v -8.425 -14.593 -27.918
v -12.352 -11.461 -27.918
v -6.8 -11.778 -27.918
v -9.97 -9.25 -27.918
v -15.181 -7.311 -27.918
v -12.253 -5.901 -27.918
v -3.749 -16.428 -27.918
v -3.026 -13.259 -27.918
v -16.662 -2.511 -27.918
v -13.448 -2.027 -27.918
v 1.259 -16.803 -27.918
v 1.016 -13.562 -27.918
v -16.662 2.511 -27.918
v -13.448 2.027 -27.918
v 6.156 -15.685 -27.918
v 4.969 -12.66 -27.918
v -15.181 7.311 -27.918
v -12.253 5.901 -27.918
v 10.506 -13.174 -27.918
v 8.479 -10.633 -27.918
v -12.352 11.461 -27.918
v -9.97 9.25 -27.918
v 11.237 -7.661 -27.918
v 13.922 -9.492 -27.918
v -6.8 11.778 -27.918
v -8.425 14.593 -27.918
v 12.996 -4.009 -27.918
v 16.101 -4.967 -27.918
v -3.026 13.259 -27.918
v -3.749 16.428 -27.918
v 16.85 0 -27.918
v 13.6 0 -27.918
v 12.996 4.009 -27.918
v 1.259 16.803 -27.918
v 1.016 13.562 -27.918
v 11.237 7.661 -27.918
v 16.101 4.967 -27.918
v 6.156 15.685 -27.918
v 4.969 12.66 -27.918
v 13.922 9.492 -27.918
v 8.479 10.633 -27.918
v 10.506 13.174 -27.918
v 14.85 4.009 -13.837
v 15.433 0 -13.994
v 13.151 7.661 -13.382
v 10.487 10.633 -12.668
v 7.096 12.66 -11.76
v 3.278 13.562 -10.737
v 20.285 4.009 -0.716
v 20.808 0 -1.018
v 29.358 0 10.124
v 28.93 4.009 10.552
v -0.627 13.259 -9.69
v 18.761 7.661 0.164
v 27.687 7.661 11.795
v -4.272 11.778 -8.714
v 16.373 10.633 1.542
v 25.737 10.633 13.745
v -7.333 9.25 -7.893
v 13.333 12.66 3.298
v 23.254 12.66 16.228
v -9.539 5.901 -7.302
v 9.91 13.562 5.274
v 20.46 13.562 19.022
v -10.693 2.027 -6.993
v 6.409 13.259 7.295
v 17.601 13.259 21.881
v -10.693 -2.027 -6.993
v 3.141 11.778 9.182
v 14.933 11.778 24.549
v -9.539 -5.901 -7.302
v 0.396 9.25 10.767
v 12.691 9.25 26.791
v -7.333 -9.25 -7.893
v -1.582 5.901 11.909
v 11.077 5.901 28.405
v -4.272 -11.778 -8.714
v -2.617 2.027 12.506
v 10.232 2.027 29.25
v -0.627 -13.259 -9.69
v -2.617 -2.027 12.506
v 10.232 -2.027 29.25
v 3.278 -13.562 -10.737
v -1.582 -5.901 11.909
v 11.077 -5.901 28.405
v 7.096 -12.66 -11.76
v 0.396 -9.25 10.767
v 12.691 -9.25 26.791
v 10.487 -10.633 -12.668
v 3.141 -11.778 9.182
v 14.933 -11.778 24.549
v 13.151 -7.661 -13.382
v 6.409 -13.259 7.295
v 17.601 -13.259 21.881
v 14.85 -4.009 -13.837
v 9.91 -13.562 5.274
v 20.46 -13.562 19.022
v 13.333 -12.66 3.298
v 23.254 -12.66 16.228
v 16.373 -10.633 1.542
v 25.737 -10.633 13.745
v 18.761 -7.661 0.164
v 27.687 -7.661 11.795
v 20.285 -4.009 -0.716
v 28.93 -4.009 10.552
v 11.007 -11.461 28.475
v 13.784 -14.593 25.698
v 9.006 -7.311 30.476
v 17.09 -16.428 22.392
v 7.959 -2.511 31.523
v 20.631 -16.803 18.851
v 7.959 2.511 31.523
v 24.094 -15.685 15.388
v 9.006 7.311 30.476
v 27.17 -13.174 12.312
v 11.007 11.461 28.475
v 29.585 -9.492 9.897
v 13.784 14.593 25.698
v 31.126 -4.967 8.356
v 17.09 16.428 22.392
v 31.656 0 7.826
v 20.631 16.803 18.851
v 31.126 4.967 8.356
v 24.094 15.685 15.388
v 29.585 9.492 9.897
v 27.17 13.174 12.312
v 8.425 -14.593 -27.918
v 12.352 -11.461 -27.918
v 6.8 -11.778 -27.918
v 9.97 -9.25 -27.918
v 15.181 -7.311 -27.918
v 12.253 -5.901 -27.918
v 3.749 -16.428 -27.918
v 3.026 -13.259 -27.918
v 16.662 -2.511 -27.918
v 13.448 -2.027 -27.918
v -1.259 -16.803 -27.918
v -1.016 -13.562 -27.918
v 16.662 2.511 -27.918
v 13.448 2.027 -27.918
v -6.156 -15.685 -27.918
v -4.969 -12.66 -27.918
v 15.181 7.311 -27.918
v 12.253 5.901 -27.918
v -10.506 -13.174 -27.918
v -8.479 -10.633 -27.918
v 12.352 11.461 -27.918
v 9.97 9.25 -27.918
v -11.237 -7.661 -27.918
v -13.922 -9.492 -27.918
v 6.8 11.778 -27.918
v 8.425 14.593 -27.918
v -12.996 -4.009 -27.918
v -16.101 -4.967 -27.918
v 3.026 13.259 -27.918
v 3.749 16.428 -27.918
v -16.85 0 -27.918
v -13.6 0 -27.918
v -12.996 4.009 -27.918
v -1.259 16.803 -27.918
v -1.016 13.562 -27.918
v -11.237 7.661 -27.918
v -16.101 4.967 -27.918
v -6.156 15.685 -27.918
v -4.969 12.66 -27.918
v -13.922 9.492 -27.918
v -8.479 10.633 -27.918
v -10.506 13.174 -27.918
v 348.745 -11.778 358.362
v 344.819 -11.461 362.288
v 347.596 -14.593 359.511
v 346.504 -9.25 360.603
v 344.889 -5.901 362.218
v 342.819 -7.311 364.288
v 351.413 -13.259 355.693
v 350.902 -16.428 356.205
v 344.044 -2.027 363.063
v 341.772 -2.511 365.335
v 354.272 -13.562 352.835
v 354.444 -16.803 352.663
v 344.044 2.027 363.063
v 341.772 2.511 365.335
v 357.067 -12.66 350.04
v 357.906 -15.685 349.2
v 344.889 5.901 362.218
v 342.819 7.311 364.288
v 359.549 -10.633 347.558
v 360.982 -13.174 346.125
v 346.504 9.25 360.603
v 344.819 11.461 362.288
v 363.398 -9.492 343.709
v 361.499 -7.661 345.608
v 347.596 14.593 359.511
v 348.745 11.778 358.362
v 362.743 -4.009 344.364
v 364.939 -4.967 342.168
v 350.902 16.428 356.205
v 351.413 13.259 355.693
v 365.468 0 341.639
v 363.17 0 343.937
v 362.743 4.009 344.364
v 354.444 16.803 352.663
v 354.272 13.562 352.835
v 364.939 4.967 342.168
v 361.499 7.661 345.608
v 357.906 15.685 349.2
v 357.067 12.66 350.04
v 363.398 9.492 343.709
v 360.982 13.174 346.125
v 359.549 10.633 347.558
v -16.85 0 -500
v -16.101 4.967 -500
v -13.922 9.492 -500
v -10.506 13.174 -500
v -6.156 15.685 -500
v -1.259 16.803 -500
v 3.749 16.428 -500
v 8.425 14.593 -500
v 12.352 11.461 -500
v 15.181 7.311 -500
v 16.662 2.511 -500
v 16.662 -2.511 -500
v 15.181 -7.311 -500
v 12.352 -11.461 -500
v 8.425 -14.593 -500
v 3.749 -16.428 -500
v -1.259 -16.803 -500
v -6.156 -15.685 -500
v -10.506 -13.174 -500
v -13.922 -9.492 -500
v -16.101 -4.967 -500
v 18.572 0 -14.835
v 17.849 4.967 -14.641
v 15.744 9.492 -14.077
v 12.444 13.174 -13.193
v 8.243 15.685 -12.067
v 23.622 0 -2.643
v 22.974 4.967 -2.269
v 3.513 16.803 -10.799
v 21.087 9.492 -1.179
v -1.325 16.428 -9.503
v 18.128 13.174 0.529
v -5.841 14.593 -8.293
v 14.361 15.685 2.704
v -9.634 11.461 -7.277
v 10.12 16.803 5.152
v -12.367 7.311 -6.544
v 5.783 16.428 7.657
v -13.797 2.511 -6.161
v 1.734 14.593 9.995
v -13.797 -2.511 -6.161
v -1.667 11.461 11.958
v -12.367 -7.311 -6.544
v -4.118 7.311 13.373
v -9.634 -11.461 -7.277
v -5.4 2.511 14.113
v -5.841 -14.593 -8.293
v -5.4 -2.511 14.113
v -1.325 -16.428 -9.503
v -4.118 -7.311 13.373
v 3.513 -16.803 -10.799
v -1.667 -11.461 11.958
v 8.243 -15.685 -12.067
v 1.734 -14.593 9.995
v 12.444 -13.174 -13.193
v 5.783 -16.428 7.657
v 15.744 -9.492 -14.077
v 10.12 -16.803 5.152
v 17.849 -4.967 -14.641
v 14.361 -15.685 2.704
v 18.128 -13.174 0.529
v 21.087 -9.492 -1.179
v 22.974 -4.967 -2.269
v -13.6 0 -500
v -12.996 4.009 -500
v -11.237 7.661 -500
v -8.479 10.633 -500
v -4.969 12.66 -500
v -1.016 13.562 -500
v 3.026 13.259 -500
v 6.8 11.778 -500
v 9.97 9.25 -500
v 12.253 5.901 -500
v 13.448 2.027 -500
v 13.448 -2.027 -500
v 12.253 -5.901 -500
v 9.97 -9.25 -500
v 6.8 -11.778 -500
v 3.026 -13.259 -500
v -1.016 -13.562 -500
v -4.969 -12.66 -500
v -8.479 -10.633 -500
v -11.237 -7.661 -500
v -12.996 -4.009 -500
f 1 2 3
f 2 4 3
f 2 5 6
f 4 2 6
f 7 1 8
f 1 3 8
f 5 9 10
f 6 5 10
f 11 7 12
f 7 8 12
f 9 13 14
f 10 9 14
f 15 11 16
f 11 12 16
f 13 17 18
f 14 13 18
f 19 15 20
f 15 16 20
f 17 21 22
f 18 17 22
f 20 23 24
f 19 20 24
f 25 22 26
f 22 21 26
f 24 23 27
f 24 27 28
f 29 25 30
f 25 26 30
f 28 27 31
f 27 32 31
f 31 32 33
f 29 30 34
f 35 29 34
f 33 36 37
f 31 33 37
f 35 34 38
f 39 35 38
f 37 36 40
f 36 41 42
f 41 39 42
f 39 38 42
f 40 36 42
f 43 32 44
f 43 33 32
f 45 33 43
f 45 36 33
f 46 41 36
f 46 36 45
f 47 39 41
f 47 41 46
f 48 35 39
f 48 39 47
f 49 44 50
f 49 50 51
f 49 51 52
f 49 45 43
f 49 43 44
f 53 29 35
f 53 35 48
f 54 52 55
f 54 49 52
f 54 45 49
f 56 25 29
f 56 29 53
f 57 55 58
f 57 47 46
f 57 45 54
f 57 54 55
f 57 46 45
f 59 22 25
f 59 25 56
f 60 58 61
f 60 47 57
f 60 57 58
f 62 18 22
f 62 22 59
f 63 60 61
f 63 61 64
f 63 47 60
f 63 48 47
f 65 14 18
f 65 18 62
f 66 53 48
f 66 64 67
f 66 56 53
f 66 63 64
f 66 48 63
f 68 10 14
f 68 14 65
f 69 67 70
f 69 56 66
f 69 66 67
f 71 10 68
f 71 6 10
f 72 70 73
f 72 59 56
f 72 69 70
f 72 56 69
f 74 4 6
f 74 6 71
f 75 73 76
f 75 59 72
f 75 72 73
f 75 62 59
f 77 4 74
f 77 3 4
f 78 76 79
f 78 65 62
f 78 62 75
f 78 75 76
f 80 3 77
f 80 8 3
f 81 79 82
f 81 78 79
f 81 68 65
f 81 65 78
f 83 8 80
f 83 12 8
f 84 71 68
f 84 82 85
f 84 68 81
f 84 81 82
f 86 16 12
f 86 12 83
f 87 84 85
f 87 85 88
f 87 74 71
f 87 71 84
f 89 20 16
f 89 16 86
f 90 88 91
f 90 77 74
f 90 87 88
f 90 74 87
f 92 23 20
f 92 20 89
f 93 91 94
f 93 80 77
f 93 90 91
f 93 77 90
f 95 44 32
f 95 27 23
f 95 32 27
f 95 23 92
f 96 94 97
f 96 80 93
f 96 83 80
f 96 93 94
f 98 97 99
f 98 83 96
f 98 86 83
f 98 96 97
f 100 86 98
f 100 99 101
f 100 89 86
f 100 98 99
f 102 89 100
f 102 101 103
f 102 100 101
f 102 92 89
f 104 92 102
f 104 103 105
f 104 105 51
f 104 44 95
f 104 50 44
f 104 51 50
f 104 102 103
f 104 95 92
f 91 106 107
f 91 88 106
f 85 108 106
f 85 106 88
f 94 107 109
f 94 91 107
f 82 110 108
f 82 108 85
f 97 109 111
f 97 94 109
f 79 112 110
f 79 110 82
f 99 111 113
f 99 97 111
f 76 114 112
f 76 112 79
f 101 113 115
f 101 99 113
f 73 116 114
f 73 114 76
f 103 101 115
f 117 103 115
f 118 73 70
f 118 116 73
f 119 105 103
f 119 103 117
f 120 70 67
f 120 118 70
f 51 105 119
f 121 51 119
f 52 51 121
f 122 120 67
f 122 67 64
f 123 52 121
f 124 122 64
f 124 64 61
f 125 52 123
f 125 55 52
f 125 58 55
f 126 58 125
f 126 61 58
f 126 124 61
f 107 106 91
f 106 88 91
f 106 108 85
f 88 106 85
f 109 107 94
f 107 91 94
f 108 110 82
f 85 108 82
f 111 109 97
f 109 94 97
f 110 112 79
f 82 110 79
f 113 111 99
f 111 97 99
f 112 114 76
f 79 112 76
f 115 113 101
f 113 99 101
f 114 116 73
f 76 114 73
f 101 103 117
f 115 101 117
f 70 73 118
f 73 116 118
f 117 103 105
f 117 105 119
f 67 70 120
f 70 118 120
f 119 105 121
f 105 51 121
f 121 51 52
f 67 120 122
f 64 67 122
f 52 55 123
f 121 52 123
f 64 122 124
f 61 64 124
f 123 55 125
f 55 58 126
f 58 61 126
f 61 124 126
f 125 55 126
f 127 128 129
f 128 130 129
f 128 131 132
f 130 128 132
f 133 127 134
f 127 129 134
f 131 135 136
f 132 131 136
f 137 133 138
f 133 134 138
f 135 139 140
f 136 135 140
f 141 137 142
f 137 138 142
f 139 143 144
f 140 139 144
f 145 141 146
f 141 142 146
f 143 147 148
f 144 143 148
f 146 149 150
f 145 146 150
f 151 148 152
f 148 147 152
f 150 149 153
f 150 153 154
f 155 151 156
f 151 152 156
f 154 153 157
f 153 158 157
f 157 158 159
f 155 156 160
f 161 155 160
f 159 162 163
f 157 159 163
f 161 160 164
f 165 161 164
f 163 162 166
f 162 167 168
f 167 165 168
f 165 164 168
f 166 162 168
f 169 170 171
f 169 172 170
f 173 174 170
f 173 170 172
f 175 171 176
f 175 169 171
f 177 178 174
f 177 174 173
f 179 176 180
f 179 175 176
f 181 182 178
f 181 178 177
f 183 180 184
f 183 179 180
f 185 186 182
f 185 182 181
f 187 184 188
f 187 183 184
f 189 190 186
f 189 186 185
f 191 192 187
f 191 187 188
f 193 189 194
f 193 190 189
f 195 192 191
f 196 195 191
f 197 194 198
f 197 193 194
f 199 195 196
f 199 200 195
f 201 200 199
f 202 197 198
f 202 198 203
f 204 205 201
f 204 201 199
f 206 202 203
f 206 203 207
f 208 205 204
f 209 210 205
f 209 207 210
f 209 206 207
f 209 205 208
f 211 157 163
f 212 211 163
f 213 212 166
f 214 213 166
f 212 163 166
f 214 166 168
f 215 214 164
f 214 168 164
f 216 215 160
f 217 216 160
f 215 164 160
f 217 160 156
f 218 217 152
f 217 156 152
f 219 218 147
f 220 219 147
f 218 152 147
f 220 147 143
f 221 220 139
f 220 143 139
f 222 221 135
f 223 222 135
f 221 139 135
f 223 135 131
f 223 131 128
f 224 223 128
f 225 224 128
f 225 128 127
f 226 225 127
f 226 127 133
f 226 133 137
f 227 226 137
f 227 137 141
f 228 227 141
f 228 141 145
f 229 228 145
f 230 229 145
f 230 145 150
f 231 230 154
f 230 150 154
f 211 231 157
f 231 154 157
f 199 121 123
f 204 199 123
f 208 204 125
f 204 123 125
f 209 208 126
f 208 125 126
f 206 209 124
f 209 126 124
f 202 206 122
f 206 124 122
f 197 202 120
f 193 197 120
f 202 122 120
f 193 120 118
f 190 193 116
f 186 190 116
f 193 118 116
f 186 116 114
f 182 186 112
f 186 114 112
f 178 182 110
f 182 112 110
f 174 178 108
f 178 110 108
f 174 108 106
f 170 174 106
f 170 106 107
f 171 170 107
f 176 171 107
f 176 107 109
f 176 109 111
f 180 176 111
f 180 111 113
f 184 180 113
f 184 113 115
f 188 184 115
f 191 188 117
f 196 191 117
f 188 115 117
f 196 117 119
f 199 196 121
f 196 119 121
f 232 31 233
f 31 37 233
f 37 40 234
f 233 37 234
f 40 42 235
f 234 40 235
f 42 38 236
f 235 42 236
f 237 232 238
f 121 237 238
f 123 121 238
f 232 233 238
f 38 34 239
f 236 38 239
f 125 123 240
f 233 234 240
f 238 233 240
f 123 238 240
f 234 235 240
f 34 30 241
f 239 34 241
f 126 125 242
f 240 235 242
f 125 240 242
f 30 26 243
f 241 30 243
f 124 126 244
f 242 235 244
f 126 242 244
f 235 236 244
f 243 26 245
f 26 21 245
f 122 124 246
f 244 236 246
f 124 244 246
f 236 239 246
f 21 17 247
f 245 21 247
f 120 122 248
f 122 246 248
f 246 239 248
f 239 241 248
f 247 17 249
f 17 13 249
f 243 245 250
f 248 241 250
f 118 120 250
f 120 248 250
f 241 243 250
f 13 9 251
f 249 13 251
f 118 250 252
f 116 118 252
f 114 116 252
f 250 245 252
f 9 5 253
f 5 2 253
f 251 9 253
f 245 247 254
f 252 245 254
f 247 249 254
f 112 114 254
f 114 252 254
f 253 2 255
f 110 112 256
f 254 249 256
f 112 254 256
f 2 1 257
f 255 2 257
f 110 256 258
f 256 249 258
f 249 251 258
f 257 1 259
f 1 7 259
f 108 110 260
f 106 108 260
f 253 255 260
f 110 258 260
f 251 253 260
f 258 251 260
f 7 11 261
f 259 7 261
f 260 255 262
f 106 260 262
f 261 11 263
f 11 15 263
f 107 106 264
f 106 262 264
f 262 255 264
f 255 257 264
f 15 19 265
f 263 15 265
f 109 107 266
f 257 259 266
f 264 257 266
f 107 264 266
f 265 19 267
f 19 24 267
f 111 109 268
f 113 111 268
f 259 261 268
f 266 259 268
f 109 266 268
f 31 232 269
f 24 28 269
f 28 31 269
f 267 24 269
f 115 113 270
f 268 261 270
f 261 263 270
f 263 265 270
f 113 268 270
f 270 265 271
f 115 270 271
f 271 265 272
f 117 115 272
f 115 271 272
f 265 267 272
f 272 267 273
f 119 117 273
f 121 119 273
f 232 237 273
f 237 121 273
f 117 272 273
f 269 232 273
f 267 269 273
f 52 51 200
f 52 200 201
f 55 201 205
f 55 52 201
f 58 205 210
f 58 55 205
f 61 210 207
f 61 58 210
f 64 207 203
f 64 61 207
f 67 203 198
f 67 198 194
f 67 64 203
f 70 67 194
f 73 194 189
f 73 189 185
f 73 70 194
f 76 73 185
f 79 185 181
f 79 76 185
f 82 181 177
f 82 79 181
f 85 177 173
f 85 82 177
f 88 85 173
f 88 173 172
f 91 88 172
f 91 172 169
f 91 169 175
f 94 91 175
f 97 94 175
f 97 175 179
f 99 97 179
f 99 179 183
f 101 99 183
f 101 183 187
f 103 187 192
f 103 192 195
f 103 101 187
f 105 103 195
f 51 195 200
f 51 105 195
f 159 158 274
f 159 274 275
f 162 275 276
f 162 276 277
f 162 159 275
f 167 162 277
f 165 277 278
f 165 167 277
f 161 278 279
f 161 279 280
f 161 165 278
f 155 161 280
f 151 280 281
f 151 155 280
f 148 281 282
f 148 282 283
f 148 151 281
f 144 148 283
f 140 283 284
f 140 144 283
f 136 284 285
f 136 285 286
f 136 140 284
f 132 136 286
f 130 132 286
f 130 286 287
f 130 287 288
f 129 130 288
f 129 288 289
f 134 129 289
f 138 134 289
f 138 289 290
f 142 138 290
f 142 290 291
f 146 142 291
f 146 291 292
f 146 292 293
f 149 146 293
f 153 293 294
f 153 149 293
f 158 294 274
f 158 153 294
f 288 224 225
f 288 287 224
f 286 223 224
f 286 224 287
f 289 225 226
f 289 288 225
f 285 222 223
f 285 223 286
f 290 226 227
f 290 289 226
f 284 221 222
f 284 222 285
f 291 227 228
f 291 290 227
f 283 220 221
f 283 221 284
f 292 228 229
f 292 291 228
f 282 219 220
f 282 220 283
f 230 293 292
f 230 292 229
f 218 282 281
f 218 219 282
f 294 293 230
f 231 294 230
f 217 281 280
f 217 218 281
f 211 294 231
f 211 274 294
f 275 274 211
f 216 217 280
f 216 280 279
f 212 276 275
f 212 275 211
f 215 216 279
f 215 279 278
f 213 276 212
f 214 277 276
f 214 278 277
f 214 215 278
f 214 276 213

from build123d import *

# Parameters (mm, degrees)
SKIZZE1_ON_SEGMENT_1_R   = 16.85
SKIZZE1_ON_SEGMENT_1_R_2 = 13.6
STRUKTURBAUTEIL2_DEPTH   = 472.082005896
SKIZZE1_ON_SEGMENT_2_R   = 16.85
SKIZZE1_ON_SEGMENT_2_R_2 = 13.6
STRUKTURBAUTEIL2_2_ANGLE = 45
SKIZZE1_R                = 16.85
SKIZZE1_R_2              = 13.6
STRUKTURBAUTEIL2_3_DEPTH = 472.082005896


with BuildPart() as part:
    # Skizze1 on segment 1 (carried to segment 1) → Strukturbauteil2 (new body)
    with BuildSketch(Plane(origin=(19.741002948, 0, 19.741002948), x_dir=(0.707106781, 0, -0.707106781), z_dir=(0.707106781, 0, 0.707106781))):
        Circle(SKIZZE1_ON_SEGMENT_1_R)
        Circle(SKIZZE1_ON_SEGMENT_1_R_2, mode=Mode.SUBTRACT)
    extrude(amount=STRUKTURBAUTEIL2_DEPTH)


with BuildPart() as body_2:
    # Skizze1 on segment 2 (carried to the start of arc 2) → Strukturbauteil2 2 (revolve)
    with BuildSketch(Plane.XY.offset(-27.917994104)):
        Circle(SKIZZE1_ON_SEGMENT_2_R)
        Circle(SKIZZE1_ON_SEGMENT_2_R_2, mode=Mode.SUBTRACT)
    revolve(axis=Axis((67.4, 0, -27.917994104), (0, 1, 0)), revolution_arc=STRUKTURBAUTEIL2_2_ANGLE)


with BuildPart() as body_3:
    # Skizze1 → Strukturbauteil2 3 (new body)
    with BuildSketch(Plane(origin=(0, 0, -27.917994104), x_dir=(-1, 0, 0), z_dir=(0, 0, -1))):
        Circle(SKIZZE1_R)
        Circle(SKIZZE1_R_2, mode=Mode.SUBTRACT)
    extrude(amount=STRUKTURBAUTEIL2_3_DEPTH)


solid = Compound([part.part, body_2.part, body_3.part])
